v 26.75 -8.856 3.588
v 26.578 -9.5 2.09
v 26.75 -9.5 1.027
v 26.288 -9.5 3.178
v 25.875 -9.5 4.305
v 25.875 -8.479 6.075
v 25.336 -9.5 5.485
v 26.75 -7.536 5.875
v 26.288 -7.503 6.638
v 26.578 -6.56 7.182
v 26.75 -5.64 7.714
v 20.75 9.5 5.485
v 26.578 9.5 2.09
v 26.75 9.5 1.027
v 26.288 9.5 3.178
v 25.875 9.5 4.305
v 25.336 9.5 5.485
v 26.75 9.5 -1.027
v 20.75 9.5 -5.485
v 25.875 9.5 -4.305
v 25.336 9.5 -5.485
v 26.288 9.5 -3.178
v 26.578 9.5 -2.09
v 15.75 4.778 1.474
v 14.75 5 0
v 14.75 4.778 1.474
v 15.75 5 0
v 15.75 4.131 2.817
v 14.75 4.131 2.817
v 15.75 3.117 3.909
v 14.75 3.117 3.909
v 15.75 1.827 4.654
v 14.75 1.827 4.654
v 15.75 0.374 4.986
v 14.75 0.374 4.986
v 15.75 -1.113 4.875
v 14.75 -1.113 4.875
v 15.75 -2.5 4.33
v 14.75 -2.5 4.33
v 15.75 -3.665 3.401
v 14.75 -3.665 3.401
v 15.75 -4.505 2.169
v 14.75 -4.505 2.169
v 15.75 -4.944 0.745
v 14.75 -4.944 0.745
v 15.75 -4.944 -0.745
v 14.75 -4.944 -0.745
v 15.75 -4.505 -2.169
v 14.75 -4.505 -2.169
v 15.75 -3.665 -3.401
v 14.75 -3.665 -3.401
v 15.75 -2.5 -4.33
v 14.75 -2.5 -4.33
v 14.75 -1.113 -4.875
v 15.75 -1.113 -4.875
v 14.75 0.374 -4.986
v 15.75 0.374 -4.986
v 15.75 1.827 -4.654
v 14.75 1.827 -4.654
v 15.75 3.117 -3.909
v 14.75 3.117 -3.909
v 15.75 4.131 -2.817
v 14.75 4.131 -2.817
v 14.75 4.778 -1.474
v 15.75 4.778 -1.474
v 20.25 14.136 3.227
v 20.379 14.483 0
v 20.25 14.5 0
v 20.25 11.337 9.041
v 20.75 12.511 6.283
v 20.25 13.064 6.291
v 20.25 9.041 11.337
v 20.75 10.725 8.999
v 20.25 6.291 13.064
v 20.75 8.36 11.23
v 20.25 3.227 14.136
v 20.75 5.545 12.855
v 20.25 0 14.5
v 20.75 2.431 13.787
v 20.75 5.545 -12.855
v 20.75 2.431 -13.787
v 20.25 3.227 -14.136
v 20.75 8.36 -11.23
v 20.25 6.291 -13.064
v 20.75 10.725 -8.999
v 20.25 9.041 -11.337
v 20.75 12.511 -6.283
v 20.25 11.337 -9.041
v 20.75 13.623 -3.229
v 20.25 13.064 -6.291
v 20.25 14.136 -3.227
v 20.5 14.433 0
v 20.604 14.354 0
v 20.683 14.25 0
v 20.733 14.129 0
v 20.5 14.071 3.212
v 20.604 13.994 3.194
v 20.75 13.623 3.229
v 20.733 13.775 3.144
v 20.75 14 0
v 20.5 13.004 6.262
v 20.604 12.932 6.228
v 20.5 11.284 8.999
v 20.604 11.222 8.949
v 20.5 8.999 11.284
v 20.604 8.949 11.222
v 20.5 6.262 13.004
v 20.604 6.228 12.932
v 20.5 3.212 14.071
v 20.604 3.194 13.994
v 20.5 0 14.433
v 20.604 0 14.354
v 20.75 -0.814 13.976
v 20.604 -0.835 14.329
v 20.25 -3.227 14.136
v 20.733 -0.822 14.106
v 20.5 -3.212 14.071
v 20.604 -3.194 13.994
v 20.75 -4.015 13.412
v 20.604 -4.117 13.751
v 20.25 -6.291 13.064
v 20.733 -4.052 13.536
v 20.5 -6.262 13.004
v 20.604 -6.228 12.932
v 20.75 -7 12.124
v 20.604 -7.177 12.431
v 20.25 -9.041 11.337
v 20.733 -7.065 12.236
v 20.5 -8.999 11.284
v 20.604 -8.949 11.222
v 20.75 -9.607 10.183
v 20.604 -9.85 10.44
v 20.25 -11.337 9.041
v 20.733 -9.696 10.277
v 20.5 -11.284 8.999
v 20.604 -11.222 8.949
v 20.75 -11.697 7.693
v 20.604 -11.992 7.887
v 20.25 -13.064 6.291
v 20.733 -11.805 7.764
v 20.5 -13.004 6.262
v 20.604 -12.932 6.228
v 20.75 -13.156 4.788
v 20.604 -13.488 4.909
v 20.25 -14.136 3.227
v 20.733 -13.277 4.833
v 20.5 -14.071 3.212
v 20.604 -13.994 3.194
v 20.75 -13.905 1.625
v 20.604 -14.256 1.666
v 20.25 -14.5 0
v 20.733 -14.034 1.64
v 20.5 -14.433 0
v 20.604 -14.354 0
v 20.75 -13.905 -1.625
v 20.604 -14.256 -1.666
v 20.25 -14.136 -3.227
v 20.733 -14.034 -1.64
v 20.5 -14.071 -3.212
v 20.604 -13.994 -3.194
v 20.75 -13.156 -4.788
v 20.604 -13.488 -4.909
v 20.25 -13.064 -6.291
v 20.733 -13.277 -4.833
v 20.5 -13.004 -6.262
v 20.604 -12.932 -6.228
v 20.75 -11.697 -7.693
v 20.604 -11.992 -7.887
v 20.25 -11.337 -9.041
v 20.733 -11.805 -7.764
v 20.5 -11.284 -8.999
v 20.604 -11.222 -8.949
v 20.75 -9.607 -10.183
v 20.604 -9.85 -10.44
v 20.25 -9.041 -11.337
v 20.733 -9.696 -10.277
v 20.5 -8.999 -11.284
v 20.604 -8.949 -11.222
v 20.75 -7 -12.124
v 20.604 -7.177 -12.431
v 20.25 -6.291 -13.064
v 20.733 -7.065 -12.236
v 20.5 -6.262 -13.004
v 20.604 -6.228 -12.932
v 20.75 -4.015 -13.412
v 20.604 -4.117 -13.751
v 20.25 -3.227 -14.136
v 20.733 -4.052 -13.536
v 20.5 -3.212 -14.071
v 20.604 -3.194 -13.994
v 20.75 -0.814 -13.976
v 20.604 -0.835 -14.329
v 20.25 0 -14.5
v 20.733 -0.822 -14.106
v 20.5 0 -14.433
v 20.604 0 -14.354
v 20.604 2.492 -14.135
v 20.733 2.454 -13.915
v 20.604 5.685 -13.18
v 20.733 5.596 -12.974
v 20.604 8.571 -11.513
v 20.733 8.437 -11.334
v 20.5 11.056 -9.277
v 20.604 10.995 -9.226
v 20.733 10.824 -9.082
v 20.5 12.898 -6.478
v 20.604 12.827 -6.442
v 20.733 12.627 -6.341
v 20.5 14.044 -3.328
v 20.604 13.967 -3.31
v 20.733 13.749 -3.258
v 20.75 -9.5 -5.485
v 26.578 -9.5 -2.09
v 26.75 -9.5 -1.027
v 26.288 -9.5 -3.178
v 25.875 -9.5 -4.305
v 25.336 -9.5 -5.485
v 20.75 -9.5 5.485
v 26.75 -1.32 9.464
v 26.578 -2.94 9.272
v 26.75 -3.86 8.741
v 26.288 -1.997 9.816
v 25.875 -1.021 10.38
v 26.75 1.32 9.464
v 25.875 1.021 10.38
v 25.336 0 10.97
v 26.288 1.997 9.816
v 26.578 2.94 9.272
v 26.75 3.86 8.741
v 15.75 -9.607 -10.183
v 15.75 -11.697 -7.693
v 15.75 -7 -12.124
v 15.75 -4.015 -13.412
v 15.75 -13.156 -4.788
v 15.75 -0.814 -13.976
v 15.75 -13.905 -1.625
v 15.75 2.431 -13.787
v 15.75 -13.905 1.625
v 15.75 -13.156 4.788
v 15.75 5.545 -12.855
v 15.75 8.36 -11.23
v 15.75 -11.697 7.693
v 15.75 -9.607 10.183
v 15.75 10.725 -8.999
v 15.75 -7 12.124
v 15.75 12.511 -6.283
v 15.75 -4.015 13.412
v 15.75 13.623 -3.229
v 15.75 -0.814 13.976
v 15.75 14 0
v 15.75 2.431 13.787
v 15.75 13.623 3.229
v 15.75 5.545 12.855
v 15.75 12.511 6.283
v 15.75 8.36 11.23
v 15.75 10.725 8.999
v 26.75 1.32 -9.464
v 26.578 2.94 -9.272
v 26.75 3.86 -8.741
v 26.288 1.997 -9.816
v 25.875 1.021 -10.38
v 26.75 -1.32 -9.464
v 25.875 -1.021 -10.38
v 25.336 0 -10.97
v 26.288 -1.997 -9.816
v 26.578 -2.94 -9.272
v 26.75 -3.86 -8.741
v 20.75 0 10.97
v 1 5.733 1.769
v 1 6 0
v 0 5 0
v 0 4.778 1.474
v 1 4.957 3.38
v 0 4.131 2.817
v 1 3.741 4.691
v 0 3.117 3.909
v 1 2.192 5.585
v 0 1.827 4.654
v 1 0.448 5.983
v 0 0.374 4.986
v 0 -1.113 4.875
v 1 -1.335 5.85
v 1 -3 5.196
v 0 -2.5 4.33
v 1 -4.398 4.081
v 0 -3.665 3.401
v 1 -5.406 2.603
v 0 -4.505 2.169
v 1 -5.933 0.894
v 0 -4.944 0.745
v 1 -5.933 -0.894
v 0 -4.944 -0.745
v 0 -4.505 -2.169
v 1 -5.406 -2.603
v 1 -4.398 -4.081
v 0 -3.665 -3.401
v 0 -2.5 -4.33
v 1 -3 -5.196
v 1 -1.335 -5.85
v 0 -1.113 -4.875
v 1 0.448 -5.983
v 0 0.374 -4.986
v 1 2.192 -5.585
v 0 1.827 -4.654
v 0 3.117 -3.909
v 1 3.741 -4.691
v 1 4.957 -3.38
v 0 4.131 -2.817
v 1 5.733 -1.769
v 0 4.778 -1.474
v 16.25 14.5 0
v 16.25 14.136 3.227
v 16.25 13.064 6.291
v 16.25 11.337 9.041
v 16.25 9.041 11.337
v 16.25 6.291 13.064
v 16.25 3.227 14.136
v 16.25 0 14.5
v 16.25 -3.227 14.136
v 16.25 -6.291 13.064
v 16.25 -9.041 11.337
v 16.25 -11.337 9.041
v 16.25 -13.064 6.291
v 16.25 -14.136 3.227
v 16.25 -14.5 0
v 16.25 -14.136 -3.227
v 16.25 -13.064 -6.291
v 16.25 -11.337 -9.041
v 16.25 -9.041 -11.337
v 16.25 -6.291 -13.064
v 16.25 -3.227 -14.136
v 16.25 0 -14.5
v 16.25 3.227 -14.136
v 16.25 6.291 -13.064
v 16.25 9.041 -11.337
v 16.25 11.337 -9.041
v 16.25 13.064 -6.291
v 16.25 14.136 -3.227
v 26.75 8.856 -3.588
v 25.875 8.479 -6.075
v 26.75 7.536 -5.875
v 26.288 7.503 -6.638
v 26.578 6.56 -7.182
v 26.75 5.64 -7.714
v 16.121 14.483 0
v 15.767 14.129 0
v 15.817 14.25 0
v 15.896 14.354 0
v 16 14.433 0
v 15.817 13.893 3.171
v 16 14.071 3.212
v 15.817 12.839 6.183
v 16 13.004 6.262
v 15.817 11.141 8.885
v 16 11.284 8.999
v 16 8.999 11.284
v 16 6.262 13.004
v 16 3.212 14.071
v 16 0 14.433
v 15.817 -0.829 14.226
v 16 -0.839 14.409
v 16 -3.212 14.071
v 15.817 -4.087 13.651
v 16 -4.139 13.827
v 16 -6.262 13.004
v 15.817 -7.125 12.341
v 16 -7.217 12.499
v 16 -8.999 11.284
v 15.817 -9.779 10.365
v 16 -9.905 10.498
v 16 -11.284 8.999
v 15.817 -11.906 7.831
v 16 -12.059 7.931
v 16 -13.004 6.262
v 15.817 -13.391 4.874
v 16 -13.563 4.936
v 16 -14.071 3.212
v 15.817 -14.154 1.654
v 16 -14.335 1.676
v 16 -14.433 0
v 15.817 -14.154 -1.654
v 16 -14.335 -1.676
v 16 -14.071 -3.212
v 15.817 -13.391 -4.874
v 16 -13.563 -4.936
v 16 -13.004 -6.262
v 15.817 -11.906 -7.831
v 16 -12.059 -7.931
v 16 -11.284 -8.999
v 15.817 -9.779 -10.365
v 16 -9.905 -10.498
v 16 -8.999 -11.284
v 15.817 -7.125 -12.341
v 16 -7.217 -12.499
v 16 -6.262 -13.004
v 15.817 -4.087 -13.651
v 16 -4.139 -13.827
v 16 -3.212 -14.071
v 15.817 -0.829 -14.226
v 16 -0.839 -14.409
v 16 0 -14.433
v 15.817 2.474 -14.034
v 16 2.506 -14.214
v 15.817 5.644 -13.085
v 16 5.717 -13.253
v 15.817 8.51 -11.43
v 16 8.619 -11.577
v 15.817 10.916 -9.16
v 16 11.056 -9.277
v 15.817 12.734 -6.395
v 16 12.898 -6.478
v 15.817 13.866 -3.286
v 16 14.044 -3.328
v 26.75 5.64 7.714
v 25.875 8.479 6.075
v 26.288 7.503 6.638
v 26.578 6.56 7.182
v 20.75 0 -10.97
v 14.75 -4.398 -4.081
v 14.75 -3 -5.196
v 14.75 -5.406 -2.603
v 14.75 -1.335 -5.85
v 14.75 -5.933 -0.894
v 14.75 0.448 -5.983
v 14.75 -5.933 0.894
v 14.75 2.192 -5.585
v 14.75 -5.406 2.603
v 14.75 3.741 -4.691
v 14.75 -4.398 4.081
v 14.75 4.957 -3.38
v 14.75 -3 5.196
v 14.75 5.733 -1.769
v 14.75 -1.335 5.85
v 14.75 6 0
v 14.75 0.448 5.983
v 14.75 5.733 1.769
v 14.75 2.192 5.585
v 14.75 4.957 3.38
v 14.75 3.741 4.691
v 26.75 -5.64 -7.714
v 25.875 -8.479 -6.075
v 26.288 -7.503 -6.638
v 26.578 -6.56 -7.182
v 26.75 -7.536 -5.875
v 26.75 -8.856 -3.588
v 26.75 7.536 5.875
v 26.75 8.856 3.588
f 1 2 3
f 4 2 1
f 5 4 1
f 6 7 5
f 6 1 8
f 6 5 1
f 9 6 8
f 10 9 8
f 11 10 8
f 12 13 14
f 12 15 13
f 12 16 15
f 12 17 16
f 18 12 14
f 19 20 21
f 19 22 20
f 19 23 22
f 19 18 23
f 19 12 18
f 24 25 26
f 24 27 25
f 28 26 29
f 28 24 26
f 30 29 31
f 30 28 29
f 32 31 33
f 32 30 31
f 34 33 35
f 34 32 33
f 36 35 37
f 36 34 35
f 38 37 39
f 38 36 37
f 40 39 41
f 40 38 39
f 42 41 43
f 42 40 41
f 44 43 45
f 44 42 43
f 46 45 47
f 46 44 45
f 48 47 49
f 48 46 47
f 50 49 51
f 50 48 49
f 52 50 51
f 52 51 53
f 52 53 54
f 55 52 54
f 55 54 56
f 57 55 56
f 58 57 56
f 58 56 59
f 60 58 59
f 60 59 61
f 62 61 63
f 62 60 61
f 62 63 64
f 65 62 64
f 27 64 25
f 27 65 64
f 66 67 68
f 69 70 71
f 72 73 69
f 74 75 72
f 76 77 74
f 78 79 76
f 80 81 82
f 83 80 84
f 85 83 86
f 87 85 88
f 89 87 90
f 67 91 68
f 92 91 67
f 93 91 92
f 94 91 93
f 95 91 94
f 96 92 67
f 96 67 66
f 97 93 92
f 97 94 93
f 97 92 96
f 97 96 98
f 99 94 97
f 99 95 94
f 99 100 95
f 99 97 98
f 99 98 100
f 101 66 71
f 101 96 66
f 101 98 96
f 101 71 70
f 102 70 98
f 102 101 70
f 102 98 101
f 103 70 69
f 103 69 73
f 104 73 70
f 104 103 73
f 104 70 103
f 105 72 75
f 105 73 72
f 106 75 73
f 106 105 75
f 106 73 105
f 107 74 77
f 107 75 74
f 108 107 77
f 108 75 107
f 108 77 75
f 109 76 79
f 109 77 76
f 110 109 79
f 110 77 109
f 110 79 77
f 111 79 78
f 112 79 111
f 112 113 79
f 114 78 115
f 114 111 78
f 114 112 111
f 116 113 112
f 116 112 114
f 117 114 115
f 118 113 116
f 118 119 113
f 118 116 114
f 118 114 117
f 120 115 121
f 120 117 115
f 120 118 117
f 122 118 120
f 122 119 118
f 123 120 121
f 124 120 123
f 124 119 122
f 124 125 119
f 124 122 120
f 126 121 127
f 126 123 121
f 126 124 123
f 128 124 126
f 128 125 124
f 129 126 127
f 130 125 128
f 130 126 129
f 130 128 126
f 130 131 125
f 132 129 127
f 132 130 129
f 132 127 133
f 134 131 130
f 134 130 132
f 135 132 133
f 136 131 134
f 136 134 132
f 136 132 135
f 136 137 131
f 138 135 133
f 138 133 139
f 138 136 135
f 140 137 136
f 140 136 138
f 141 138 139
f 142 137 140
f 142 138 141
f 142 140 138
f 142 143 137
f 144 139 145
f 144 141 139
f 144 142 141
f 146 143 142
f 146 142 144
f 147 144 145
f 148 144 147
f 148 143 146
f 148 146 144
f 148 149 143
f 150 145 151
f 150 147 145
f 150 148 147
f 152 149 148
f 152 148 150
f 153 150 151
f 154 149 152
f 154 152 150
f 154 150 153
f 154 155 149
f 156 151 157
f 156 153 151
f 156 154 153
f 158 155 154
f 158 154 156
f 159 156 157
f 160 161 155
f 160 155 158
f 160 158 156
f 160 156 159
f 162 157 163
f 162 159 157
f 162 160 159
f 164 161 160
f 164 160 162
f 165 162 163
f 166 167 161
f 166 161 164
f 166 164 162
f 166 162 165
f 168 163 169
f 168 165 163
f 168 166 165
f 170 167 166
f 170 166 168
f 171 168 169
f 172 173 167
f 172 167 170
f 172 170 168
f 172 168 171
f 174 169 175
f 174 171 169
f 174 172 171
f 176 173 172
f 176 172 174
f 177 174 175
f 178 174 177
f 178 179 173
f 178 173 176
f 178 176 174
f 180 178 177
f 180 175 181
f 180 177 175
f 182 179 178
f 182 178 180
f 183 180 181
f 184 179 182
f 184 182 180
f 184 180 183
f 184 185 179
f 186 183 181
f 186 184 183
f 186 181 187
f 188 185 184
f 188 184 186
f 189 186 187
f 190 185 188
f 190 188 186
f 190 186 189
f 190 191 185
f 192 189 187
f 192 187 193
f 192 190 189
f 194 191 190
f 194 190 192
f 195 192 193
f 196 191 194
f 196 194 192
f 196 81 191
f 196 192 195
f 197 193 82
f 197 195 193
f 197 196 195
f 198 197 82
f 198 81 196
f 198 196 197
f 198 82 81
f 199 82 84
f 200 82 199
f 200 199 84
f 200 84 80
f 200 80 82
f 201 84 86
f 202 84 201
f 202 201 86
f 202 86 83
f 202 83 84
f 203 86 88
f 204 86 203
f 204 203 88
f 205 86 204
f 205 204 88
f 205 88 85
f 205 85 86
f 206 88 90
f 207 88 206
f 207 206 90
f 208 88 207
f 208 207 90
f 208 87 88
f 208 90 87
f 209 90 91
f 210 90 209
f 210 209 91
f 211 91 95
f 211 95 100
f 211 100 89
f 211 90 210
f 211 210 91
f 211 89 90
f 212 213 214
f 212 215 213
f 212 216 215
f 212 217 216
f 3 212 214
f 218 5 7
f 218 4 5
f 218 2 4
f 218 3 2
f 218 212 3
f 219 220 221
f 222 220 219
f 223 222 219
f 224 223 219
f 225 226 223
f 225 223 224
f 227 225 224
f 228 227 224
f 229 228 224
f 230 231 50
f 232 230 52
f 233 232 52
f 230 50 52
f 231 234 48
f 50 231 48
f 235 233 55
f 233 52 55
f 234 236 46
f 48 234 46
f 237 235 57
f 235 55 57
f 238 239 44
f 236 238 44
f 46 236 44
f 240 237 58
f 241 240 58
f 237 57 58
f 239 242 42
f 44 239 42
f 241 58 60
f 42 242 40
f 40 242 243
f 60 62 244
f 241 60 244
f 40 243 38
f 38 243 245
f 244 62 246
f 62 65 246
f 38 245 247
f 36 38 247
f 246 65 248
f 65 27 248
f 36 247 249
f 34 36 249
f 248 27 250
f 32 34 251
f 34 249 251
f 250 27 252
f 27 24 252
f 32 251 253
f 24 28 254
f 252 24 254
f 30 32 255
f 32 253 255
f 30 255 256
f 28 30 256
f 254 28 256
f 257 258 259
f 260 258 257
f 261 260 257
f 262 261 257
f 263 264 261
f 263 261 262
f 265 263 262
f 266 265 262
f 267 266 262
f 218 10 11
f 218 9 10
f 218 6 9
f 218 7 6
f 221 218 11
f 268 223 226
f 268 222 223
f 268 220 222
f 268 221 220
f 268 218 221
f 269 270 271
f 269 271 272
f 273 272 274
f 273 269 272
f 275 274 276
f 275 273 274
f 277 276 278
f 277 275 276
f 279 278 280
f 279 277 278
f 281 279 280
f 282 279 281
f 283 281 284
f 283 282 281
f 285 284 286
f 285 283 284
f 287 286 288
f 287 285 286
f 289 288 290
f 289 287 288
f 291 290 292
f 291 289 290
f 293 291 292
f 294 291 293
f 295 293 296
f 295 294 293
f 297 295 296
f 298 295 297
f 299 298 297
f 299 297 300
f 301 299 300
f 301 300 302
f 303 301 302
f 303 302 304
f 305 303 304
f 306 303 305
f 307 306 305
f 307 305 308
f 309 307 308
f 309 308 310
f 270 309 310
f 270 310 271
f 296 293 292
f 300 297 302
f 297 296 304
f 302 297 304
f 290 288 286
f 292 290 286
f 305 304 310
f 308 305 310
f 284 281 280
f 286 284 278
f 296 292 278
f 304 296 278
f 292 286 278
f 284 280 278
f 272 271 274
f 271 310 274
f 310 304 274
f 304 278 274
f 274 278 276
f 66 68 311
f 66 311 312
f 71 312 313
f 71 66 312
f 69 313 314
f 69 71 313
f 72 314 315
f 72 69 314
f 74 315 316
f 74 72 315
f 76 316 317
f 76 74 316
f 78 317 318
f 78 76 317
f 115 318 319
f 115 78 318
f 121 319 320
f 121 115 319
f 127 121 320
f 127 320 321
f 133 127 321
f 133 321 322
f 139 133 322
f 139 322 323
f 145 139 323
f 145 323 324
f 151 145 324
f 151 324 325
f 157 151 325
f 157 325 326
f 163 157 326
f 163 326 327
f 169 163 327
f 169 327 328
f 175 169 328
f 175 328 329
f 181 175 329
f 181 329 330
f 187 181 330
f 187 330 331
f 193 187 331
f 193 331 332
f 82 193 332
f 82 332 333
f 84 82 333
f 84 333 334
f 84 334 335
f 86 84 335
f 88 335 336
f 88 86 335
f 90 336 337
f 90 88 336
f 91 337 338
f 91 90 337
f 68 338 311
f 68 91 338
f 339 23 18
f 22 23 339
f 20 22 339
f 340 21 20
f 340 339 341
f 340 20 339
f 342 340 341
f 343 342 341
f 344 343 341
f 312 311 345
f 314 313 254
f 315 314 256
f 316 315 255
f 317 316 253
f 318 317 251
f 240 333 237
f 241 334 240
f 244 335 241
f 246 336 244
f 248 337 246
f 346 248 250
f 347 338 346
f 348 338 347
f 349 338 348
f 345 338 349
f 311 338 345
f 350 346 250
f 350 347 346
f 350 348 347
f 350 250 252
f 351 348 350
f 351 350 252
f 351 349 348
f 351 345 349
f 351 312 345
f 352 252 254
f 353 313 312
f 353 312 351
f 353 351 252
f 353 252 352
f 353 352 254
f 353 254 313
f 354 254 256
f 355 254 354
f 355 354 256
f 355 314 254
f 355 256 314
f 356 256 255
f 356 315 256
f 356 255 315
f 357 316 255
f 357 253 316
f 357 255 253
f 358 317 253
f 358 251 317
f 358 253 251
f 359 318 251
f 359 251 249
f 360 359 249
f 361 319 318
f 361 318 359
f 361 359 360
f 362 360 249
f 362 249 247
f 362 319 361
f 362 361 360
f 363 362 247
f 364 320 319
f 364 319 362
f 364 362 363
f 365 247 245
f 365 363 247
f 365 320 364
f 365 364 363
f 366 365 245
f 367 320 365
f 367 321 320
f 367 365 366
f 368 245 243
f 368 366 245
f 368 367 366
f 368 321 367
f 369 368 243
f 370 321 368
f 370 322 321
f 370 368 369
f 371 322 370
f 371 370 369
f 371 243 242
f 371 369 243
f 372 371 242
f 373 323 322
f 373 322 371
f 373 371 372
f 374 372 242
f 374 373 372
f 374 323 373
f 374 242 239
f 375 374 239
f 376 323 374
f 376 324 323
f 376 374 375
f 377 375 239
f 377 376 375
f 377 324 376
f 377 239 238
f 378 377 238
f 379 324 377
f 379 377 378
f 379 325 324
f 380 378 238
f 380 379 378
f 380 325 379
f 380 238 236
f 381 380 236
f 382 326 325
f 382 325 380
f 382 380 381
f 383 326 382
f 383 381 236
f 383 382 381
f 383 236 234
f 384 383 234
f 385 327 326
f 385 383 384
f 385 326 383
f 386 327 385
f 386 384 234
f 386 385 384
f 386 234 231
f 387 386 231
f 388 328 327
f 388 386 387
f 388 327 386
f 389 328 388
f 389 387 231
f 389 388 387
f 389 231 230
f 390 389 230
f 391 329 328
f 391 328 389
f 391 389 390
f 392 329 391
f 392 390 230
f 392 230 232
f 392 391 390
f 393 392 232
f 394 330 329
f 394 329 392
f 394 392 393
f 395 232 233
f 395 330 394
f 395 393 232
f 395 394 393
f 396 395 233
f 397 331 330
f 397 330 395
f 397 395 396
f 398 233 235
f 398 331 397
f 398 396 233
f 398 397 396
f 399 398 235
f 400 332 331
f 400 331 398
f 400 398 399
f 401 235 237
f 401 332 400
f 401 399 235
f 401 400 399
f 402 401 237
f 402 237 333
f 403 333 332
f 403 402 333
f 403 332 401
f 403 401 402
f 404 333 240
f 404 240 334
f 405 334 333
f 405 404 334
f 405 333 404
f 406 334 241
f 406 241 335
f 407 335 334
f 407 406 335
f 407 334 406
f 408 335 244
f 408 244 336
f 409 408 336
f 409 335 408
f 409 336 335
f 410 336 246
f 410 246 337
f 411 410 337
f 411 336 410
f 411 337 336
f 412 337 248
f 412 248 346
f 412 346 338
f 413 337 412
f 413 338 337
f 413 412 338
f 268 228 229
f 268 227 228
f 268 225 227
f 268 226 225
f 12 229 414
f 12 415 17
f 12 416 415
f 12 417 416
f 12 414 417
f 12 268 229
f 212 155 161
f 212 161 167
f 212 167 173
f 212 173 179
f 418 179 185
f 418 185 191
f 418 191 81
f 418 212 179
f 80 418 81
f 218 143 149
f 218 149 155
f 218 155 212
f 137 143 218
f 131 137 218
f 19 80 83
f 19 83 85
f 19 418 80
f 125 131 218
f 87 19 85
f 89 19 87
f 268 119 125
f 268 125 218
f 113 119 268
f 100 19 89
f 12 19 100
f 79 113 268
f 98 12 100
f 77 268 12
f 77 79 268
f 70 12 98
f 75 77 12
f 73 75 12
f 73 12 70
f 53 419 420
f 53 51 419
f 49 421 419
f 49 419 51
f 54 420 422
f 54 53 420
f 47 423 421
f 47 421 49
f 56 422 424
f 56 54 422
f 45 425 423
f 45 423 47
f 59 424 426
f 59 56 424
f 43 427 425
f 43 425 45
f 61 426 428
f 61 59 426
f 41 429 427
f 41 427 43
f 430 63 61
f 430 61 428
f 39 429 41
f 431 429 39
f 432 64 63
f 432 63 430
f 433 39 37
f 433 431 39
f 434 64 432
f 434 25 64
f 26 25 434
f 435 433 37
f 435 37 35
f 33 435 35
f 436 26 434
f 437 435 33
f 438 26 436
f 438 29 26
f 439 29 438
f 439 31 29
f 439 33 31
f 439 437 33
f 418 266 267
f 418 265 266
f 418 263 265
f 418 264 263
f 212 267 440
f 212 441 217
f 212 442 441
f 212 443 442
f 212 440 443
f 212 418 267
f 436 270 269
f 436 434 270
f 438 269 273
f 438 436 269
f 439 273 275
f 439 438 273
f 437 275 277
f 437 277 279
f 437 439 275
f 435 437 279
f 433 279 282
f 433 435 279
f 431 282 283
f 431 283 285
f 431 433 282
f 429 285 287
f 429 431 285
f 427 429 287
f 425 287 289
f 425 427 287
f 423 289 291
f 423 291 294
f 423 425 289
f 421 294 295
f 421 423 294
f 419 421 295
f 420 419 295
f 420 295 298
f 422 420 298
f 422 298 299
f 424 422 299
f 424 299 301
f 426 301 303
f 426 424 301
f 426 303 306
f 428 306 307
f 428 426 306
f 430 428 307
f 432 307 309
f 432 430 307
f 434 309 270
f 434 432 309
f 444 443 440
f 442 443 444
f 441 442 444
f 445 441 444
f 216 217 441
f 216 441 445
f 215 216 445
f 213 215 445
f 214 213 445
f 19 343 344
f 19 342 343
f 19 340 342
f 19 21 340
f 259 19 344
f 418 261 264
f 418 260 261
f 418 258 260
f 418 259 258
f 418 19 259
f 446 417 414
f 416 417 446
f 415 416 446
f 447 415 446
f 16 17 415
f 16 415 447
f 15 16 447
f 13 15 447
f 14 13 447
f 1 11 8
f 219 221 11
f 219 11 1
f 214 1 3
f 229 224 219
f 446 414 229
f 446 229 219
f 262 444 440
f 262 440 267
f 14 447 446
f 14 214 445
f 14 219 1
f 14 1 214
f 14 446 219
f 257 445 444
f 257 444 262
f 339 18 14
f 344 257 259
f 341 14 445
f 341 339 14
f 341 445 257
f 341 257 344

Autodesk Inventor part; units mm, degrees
ref_plane "YZ Plane" through (0, 0, 0) normal (1, 0, 0) x (0, 1, 0)
ref_plane "XZ Plane" through (0, 0, 0) normal (0, 1, 0) x (-1, 0, 0)
ref_plane "XY Plane" through (0, 0, 0) normal (0, 0, 1) x (1, 0, 0)
sketch "Эскиз1" plane through (0, 0, 0) normal (0, 0, 1) x (1, 0, 0)
  line L0 (0, 0) -> (21.2967, 0)
  line L1 (0, 0) -> (0, 6)
  line L2 (0, 6) -> (14.75, 6)
  line L3 (14.75, 6) -> (14.75, 5)
  line L4 (14.75, 5) -> (15.75, 5)
  line L5 (15.75, 5) -> (15.75, 14.5)
  line L6 (15.75, 14.5) -> (20.75, 14.5)
  line L7 (20.75, 14.5) -> (20.75, 0)
  dimension "d0" = 12
  dimension "d1" = 10
  dimension "d2" = 29
  dimension "d3" = 1
  dimension "d4" = 14.75
  dimension "d5" = 5
revolve "Вращение1" add sketch "Эскиз1" angle 360 about axis through (0, 0, 0) along (1, 0, 0)
chamfer "Фаска1" distance 1 angle 45 1 edges at (0, -6, 0)
fillet "Сопряжение1" radius 0.5 2 edges at (15.75, -14.5, 0) (20.75, -14.5, 0)
sketch "Эскиз2" plane through (20.75, 0, 0) normal (1, 0, 0) x (0, 0, -1)
  line L0 (5.4848, 9.5) -> (10.9697, 0)
  line L1 (10.9697, 0) -> (5.4848, -9.5)
  line L2 (5.4848, -9.5) -> (-5.4848, -9.5)
  line L3 (-5.4848, -9.5) -> (-10.9697, 0)
  line L4 (-10.9697, 0) -> (-5.4848, 9.5)
  line L5 (-5.4848, 9.5) -> (5.4848, 9.5)
  point P0 (0, 0)
  point P1 (0, 0)
  dimension "d11" = 19
extrude "Выдавливание1" add sketch "Эскиз2" along normal blind 6
sketch "Эскиз3" plane through (0, 0, 0) normal (0, 1, 0) x (-1, 0, 0)
  line L0 (-20.75, 10.9697) -> (-26.75, 10.9697) projected
  line L1 (-25.3358, 10.9697) -> (-26.75, 9.5554)
  line L2 (-26.75, 5.4848) -> (-26.75, 10.9697) projected
  line L3 (3.6, 0) -> (-21.6, 0) projected
  point P0 (0, 0)
  dimension "d14" = 2
  dimension "d15" = 45
revolve "Вращение2" cut sketch "Эскиз3" angle 360 about axis through (-10, 0, 0) along (1, 0, 0)
thread "Резьба1" size "M12x1.75" class "6g" standard "ANSI Metric M Profile" length 18
properties part number "Слив_масла"
